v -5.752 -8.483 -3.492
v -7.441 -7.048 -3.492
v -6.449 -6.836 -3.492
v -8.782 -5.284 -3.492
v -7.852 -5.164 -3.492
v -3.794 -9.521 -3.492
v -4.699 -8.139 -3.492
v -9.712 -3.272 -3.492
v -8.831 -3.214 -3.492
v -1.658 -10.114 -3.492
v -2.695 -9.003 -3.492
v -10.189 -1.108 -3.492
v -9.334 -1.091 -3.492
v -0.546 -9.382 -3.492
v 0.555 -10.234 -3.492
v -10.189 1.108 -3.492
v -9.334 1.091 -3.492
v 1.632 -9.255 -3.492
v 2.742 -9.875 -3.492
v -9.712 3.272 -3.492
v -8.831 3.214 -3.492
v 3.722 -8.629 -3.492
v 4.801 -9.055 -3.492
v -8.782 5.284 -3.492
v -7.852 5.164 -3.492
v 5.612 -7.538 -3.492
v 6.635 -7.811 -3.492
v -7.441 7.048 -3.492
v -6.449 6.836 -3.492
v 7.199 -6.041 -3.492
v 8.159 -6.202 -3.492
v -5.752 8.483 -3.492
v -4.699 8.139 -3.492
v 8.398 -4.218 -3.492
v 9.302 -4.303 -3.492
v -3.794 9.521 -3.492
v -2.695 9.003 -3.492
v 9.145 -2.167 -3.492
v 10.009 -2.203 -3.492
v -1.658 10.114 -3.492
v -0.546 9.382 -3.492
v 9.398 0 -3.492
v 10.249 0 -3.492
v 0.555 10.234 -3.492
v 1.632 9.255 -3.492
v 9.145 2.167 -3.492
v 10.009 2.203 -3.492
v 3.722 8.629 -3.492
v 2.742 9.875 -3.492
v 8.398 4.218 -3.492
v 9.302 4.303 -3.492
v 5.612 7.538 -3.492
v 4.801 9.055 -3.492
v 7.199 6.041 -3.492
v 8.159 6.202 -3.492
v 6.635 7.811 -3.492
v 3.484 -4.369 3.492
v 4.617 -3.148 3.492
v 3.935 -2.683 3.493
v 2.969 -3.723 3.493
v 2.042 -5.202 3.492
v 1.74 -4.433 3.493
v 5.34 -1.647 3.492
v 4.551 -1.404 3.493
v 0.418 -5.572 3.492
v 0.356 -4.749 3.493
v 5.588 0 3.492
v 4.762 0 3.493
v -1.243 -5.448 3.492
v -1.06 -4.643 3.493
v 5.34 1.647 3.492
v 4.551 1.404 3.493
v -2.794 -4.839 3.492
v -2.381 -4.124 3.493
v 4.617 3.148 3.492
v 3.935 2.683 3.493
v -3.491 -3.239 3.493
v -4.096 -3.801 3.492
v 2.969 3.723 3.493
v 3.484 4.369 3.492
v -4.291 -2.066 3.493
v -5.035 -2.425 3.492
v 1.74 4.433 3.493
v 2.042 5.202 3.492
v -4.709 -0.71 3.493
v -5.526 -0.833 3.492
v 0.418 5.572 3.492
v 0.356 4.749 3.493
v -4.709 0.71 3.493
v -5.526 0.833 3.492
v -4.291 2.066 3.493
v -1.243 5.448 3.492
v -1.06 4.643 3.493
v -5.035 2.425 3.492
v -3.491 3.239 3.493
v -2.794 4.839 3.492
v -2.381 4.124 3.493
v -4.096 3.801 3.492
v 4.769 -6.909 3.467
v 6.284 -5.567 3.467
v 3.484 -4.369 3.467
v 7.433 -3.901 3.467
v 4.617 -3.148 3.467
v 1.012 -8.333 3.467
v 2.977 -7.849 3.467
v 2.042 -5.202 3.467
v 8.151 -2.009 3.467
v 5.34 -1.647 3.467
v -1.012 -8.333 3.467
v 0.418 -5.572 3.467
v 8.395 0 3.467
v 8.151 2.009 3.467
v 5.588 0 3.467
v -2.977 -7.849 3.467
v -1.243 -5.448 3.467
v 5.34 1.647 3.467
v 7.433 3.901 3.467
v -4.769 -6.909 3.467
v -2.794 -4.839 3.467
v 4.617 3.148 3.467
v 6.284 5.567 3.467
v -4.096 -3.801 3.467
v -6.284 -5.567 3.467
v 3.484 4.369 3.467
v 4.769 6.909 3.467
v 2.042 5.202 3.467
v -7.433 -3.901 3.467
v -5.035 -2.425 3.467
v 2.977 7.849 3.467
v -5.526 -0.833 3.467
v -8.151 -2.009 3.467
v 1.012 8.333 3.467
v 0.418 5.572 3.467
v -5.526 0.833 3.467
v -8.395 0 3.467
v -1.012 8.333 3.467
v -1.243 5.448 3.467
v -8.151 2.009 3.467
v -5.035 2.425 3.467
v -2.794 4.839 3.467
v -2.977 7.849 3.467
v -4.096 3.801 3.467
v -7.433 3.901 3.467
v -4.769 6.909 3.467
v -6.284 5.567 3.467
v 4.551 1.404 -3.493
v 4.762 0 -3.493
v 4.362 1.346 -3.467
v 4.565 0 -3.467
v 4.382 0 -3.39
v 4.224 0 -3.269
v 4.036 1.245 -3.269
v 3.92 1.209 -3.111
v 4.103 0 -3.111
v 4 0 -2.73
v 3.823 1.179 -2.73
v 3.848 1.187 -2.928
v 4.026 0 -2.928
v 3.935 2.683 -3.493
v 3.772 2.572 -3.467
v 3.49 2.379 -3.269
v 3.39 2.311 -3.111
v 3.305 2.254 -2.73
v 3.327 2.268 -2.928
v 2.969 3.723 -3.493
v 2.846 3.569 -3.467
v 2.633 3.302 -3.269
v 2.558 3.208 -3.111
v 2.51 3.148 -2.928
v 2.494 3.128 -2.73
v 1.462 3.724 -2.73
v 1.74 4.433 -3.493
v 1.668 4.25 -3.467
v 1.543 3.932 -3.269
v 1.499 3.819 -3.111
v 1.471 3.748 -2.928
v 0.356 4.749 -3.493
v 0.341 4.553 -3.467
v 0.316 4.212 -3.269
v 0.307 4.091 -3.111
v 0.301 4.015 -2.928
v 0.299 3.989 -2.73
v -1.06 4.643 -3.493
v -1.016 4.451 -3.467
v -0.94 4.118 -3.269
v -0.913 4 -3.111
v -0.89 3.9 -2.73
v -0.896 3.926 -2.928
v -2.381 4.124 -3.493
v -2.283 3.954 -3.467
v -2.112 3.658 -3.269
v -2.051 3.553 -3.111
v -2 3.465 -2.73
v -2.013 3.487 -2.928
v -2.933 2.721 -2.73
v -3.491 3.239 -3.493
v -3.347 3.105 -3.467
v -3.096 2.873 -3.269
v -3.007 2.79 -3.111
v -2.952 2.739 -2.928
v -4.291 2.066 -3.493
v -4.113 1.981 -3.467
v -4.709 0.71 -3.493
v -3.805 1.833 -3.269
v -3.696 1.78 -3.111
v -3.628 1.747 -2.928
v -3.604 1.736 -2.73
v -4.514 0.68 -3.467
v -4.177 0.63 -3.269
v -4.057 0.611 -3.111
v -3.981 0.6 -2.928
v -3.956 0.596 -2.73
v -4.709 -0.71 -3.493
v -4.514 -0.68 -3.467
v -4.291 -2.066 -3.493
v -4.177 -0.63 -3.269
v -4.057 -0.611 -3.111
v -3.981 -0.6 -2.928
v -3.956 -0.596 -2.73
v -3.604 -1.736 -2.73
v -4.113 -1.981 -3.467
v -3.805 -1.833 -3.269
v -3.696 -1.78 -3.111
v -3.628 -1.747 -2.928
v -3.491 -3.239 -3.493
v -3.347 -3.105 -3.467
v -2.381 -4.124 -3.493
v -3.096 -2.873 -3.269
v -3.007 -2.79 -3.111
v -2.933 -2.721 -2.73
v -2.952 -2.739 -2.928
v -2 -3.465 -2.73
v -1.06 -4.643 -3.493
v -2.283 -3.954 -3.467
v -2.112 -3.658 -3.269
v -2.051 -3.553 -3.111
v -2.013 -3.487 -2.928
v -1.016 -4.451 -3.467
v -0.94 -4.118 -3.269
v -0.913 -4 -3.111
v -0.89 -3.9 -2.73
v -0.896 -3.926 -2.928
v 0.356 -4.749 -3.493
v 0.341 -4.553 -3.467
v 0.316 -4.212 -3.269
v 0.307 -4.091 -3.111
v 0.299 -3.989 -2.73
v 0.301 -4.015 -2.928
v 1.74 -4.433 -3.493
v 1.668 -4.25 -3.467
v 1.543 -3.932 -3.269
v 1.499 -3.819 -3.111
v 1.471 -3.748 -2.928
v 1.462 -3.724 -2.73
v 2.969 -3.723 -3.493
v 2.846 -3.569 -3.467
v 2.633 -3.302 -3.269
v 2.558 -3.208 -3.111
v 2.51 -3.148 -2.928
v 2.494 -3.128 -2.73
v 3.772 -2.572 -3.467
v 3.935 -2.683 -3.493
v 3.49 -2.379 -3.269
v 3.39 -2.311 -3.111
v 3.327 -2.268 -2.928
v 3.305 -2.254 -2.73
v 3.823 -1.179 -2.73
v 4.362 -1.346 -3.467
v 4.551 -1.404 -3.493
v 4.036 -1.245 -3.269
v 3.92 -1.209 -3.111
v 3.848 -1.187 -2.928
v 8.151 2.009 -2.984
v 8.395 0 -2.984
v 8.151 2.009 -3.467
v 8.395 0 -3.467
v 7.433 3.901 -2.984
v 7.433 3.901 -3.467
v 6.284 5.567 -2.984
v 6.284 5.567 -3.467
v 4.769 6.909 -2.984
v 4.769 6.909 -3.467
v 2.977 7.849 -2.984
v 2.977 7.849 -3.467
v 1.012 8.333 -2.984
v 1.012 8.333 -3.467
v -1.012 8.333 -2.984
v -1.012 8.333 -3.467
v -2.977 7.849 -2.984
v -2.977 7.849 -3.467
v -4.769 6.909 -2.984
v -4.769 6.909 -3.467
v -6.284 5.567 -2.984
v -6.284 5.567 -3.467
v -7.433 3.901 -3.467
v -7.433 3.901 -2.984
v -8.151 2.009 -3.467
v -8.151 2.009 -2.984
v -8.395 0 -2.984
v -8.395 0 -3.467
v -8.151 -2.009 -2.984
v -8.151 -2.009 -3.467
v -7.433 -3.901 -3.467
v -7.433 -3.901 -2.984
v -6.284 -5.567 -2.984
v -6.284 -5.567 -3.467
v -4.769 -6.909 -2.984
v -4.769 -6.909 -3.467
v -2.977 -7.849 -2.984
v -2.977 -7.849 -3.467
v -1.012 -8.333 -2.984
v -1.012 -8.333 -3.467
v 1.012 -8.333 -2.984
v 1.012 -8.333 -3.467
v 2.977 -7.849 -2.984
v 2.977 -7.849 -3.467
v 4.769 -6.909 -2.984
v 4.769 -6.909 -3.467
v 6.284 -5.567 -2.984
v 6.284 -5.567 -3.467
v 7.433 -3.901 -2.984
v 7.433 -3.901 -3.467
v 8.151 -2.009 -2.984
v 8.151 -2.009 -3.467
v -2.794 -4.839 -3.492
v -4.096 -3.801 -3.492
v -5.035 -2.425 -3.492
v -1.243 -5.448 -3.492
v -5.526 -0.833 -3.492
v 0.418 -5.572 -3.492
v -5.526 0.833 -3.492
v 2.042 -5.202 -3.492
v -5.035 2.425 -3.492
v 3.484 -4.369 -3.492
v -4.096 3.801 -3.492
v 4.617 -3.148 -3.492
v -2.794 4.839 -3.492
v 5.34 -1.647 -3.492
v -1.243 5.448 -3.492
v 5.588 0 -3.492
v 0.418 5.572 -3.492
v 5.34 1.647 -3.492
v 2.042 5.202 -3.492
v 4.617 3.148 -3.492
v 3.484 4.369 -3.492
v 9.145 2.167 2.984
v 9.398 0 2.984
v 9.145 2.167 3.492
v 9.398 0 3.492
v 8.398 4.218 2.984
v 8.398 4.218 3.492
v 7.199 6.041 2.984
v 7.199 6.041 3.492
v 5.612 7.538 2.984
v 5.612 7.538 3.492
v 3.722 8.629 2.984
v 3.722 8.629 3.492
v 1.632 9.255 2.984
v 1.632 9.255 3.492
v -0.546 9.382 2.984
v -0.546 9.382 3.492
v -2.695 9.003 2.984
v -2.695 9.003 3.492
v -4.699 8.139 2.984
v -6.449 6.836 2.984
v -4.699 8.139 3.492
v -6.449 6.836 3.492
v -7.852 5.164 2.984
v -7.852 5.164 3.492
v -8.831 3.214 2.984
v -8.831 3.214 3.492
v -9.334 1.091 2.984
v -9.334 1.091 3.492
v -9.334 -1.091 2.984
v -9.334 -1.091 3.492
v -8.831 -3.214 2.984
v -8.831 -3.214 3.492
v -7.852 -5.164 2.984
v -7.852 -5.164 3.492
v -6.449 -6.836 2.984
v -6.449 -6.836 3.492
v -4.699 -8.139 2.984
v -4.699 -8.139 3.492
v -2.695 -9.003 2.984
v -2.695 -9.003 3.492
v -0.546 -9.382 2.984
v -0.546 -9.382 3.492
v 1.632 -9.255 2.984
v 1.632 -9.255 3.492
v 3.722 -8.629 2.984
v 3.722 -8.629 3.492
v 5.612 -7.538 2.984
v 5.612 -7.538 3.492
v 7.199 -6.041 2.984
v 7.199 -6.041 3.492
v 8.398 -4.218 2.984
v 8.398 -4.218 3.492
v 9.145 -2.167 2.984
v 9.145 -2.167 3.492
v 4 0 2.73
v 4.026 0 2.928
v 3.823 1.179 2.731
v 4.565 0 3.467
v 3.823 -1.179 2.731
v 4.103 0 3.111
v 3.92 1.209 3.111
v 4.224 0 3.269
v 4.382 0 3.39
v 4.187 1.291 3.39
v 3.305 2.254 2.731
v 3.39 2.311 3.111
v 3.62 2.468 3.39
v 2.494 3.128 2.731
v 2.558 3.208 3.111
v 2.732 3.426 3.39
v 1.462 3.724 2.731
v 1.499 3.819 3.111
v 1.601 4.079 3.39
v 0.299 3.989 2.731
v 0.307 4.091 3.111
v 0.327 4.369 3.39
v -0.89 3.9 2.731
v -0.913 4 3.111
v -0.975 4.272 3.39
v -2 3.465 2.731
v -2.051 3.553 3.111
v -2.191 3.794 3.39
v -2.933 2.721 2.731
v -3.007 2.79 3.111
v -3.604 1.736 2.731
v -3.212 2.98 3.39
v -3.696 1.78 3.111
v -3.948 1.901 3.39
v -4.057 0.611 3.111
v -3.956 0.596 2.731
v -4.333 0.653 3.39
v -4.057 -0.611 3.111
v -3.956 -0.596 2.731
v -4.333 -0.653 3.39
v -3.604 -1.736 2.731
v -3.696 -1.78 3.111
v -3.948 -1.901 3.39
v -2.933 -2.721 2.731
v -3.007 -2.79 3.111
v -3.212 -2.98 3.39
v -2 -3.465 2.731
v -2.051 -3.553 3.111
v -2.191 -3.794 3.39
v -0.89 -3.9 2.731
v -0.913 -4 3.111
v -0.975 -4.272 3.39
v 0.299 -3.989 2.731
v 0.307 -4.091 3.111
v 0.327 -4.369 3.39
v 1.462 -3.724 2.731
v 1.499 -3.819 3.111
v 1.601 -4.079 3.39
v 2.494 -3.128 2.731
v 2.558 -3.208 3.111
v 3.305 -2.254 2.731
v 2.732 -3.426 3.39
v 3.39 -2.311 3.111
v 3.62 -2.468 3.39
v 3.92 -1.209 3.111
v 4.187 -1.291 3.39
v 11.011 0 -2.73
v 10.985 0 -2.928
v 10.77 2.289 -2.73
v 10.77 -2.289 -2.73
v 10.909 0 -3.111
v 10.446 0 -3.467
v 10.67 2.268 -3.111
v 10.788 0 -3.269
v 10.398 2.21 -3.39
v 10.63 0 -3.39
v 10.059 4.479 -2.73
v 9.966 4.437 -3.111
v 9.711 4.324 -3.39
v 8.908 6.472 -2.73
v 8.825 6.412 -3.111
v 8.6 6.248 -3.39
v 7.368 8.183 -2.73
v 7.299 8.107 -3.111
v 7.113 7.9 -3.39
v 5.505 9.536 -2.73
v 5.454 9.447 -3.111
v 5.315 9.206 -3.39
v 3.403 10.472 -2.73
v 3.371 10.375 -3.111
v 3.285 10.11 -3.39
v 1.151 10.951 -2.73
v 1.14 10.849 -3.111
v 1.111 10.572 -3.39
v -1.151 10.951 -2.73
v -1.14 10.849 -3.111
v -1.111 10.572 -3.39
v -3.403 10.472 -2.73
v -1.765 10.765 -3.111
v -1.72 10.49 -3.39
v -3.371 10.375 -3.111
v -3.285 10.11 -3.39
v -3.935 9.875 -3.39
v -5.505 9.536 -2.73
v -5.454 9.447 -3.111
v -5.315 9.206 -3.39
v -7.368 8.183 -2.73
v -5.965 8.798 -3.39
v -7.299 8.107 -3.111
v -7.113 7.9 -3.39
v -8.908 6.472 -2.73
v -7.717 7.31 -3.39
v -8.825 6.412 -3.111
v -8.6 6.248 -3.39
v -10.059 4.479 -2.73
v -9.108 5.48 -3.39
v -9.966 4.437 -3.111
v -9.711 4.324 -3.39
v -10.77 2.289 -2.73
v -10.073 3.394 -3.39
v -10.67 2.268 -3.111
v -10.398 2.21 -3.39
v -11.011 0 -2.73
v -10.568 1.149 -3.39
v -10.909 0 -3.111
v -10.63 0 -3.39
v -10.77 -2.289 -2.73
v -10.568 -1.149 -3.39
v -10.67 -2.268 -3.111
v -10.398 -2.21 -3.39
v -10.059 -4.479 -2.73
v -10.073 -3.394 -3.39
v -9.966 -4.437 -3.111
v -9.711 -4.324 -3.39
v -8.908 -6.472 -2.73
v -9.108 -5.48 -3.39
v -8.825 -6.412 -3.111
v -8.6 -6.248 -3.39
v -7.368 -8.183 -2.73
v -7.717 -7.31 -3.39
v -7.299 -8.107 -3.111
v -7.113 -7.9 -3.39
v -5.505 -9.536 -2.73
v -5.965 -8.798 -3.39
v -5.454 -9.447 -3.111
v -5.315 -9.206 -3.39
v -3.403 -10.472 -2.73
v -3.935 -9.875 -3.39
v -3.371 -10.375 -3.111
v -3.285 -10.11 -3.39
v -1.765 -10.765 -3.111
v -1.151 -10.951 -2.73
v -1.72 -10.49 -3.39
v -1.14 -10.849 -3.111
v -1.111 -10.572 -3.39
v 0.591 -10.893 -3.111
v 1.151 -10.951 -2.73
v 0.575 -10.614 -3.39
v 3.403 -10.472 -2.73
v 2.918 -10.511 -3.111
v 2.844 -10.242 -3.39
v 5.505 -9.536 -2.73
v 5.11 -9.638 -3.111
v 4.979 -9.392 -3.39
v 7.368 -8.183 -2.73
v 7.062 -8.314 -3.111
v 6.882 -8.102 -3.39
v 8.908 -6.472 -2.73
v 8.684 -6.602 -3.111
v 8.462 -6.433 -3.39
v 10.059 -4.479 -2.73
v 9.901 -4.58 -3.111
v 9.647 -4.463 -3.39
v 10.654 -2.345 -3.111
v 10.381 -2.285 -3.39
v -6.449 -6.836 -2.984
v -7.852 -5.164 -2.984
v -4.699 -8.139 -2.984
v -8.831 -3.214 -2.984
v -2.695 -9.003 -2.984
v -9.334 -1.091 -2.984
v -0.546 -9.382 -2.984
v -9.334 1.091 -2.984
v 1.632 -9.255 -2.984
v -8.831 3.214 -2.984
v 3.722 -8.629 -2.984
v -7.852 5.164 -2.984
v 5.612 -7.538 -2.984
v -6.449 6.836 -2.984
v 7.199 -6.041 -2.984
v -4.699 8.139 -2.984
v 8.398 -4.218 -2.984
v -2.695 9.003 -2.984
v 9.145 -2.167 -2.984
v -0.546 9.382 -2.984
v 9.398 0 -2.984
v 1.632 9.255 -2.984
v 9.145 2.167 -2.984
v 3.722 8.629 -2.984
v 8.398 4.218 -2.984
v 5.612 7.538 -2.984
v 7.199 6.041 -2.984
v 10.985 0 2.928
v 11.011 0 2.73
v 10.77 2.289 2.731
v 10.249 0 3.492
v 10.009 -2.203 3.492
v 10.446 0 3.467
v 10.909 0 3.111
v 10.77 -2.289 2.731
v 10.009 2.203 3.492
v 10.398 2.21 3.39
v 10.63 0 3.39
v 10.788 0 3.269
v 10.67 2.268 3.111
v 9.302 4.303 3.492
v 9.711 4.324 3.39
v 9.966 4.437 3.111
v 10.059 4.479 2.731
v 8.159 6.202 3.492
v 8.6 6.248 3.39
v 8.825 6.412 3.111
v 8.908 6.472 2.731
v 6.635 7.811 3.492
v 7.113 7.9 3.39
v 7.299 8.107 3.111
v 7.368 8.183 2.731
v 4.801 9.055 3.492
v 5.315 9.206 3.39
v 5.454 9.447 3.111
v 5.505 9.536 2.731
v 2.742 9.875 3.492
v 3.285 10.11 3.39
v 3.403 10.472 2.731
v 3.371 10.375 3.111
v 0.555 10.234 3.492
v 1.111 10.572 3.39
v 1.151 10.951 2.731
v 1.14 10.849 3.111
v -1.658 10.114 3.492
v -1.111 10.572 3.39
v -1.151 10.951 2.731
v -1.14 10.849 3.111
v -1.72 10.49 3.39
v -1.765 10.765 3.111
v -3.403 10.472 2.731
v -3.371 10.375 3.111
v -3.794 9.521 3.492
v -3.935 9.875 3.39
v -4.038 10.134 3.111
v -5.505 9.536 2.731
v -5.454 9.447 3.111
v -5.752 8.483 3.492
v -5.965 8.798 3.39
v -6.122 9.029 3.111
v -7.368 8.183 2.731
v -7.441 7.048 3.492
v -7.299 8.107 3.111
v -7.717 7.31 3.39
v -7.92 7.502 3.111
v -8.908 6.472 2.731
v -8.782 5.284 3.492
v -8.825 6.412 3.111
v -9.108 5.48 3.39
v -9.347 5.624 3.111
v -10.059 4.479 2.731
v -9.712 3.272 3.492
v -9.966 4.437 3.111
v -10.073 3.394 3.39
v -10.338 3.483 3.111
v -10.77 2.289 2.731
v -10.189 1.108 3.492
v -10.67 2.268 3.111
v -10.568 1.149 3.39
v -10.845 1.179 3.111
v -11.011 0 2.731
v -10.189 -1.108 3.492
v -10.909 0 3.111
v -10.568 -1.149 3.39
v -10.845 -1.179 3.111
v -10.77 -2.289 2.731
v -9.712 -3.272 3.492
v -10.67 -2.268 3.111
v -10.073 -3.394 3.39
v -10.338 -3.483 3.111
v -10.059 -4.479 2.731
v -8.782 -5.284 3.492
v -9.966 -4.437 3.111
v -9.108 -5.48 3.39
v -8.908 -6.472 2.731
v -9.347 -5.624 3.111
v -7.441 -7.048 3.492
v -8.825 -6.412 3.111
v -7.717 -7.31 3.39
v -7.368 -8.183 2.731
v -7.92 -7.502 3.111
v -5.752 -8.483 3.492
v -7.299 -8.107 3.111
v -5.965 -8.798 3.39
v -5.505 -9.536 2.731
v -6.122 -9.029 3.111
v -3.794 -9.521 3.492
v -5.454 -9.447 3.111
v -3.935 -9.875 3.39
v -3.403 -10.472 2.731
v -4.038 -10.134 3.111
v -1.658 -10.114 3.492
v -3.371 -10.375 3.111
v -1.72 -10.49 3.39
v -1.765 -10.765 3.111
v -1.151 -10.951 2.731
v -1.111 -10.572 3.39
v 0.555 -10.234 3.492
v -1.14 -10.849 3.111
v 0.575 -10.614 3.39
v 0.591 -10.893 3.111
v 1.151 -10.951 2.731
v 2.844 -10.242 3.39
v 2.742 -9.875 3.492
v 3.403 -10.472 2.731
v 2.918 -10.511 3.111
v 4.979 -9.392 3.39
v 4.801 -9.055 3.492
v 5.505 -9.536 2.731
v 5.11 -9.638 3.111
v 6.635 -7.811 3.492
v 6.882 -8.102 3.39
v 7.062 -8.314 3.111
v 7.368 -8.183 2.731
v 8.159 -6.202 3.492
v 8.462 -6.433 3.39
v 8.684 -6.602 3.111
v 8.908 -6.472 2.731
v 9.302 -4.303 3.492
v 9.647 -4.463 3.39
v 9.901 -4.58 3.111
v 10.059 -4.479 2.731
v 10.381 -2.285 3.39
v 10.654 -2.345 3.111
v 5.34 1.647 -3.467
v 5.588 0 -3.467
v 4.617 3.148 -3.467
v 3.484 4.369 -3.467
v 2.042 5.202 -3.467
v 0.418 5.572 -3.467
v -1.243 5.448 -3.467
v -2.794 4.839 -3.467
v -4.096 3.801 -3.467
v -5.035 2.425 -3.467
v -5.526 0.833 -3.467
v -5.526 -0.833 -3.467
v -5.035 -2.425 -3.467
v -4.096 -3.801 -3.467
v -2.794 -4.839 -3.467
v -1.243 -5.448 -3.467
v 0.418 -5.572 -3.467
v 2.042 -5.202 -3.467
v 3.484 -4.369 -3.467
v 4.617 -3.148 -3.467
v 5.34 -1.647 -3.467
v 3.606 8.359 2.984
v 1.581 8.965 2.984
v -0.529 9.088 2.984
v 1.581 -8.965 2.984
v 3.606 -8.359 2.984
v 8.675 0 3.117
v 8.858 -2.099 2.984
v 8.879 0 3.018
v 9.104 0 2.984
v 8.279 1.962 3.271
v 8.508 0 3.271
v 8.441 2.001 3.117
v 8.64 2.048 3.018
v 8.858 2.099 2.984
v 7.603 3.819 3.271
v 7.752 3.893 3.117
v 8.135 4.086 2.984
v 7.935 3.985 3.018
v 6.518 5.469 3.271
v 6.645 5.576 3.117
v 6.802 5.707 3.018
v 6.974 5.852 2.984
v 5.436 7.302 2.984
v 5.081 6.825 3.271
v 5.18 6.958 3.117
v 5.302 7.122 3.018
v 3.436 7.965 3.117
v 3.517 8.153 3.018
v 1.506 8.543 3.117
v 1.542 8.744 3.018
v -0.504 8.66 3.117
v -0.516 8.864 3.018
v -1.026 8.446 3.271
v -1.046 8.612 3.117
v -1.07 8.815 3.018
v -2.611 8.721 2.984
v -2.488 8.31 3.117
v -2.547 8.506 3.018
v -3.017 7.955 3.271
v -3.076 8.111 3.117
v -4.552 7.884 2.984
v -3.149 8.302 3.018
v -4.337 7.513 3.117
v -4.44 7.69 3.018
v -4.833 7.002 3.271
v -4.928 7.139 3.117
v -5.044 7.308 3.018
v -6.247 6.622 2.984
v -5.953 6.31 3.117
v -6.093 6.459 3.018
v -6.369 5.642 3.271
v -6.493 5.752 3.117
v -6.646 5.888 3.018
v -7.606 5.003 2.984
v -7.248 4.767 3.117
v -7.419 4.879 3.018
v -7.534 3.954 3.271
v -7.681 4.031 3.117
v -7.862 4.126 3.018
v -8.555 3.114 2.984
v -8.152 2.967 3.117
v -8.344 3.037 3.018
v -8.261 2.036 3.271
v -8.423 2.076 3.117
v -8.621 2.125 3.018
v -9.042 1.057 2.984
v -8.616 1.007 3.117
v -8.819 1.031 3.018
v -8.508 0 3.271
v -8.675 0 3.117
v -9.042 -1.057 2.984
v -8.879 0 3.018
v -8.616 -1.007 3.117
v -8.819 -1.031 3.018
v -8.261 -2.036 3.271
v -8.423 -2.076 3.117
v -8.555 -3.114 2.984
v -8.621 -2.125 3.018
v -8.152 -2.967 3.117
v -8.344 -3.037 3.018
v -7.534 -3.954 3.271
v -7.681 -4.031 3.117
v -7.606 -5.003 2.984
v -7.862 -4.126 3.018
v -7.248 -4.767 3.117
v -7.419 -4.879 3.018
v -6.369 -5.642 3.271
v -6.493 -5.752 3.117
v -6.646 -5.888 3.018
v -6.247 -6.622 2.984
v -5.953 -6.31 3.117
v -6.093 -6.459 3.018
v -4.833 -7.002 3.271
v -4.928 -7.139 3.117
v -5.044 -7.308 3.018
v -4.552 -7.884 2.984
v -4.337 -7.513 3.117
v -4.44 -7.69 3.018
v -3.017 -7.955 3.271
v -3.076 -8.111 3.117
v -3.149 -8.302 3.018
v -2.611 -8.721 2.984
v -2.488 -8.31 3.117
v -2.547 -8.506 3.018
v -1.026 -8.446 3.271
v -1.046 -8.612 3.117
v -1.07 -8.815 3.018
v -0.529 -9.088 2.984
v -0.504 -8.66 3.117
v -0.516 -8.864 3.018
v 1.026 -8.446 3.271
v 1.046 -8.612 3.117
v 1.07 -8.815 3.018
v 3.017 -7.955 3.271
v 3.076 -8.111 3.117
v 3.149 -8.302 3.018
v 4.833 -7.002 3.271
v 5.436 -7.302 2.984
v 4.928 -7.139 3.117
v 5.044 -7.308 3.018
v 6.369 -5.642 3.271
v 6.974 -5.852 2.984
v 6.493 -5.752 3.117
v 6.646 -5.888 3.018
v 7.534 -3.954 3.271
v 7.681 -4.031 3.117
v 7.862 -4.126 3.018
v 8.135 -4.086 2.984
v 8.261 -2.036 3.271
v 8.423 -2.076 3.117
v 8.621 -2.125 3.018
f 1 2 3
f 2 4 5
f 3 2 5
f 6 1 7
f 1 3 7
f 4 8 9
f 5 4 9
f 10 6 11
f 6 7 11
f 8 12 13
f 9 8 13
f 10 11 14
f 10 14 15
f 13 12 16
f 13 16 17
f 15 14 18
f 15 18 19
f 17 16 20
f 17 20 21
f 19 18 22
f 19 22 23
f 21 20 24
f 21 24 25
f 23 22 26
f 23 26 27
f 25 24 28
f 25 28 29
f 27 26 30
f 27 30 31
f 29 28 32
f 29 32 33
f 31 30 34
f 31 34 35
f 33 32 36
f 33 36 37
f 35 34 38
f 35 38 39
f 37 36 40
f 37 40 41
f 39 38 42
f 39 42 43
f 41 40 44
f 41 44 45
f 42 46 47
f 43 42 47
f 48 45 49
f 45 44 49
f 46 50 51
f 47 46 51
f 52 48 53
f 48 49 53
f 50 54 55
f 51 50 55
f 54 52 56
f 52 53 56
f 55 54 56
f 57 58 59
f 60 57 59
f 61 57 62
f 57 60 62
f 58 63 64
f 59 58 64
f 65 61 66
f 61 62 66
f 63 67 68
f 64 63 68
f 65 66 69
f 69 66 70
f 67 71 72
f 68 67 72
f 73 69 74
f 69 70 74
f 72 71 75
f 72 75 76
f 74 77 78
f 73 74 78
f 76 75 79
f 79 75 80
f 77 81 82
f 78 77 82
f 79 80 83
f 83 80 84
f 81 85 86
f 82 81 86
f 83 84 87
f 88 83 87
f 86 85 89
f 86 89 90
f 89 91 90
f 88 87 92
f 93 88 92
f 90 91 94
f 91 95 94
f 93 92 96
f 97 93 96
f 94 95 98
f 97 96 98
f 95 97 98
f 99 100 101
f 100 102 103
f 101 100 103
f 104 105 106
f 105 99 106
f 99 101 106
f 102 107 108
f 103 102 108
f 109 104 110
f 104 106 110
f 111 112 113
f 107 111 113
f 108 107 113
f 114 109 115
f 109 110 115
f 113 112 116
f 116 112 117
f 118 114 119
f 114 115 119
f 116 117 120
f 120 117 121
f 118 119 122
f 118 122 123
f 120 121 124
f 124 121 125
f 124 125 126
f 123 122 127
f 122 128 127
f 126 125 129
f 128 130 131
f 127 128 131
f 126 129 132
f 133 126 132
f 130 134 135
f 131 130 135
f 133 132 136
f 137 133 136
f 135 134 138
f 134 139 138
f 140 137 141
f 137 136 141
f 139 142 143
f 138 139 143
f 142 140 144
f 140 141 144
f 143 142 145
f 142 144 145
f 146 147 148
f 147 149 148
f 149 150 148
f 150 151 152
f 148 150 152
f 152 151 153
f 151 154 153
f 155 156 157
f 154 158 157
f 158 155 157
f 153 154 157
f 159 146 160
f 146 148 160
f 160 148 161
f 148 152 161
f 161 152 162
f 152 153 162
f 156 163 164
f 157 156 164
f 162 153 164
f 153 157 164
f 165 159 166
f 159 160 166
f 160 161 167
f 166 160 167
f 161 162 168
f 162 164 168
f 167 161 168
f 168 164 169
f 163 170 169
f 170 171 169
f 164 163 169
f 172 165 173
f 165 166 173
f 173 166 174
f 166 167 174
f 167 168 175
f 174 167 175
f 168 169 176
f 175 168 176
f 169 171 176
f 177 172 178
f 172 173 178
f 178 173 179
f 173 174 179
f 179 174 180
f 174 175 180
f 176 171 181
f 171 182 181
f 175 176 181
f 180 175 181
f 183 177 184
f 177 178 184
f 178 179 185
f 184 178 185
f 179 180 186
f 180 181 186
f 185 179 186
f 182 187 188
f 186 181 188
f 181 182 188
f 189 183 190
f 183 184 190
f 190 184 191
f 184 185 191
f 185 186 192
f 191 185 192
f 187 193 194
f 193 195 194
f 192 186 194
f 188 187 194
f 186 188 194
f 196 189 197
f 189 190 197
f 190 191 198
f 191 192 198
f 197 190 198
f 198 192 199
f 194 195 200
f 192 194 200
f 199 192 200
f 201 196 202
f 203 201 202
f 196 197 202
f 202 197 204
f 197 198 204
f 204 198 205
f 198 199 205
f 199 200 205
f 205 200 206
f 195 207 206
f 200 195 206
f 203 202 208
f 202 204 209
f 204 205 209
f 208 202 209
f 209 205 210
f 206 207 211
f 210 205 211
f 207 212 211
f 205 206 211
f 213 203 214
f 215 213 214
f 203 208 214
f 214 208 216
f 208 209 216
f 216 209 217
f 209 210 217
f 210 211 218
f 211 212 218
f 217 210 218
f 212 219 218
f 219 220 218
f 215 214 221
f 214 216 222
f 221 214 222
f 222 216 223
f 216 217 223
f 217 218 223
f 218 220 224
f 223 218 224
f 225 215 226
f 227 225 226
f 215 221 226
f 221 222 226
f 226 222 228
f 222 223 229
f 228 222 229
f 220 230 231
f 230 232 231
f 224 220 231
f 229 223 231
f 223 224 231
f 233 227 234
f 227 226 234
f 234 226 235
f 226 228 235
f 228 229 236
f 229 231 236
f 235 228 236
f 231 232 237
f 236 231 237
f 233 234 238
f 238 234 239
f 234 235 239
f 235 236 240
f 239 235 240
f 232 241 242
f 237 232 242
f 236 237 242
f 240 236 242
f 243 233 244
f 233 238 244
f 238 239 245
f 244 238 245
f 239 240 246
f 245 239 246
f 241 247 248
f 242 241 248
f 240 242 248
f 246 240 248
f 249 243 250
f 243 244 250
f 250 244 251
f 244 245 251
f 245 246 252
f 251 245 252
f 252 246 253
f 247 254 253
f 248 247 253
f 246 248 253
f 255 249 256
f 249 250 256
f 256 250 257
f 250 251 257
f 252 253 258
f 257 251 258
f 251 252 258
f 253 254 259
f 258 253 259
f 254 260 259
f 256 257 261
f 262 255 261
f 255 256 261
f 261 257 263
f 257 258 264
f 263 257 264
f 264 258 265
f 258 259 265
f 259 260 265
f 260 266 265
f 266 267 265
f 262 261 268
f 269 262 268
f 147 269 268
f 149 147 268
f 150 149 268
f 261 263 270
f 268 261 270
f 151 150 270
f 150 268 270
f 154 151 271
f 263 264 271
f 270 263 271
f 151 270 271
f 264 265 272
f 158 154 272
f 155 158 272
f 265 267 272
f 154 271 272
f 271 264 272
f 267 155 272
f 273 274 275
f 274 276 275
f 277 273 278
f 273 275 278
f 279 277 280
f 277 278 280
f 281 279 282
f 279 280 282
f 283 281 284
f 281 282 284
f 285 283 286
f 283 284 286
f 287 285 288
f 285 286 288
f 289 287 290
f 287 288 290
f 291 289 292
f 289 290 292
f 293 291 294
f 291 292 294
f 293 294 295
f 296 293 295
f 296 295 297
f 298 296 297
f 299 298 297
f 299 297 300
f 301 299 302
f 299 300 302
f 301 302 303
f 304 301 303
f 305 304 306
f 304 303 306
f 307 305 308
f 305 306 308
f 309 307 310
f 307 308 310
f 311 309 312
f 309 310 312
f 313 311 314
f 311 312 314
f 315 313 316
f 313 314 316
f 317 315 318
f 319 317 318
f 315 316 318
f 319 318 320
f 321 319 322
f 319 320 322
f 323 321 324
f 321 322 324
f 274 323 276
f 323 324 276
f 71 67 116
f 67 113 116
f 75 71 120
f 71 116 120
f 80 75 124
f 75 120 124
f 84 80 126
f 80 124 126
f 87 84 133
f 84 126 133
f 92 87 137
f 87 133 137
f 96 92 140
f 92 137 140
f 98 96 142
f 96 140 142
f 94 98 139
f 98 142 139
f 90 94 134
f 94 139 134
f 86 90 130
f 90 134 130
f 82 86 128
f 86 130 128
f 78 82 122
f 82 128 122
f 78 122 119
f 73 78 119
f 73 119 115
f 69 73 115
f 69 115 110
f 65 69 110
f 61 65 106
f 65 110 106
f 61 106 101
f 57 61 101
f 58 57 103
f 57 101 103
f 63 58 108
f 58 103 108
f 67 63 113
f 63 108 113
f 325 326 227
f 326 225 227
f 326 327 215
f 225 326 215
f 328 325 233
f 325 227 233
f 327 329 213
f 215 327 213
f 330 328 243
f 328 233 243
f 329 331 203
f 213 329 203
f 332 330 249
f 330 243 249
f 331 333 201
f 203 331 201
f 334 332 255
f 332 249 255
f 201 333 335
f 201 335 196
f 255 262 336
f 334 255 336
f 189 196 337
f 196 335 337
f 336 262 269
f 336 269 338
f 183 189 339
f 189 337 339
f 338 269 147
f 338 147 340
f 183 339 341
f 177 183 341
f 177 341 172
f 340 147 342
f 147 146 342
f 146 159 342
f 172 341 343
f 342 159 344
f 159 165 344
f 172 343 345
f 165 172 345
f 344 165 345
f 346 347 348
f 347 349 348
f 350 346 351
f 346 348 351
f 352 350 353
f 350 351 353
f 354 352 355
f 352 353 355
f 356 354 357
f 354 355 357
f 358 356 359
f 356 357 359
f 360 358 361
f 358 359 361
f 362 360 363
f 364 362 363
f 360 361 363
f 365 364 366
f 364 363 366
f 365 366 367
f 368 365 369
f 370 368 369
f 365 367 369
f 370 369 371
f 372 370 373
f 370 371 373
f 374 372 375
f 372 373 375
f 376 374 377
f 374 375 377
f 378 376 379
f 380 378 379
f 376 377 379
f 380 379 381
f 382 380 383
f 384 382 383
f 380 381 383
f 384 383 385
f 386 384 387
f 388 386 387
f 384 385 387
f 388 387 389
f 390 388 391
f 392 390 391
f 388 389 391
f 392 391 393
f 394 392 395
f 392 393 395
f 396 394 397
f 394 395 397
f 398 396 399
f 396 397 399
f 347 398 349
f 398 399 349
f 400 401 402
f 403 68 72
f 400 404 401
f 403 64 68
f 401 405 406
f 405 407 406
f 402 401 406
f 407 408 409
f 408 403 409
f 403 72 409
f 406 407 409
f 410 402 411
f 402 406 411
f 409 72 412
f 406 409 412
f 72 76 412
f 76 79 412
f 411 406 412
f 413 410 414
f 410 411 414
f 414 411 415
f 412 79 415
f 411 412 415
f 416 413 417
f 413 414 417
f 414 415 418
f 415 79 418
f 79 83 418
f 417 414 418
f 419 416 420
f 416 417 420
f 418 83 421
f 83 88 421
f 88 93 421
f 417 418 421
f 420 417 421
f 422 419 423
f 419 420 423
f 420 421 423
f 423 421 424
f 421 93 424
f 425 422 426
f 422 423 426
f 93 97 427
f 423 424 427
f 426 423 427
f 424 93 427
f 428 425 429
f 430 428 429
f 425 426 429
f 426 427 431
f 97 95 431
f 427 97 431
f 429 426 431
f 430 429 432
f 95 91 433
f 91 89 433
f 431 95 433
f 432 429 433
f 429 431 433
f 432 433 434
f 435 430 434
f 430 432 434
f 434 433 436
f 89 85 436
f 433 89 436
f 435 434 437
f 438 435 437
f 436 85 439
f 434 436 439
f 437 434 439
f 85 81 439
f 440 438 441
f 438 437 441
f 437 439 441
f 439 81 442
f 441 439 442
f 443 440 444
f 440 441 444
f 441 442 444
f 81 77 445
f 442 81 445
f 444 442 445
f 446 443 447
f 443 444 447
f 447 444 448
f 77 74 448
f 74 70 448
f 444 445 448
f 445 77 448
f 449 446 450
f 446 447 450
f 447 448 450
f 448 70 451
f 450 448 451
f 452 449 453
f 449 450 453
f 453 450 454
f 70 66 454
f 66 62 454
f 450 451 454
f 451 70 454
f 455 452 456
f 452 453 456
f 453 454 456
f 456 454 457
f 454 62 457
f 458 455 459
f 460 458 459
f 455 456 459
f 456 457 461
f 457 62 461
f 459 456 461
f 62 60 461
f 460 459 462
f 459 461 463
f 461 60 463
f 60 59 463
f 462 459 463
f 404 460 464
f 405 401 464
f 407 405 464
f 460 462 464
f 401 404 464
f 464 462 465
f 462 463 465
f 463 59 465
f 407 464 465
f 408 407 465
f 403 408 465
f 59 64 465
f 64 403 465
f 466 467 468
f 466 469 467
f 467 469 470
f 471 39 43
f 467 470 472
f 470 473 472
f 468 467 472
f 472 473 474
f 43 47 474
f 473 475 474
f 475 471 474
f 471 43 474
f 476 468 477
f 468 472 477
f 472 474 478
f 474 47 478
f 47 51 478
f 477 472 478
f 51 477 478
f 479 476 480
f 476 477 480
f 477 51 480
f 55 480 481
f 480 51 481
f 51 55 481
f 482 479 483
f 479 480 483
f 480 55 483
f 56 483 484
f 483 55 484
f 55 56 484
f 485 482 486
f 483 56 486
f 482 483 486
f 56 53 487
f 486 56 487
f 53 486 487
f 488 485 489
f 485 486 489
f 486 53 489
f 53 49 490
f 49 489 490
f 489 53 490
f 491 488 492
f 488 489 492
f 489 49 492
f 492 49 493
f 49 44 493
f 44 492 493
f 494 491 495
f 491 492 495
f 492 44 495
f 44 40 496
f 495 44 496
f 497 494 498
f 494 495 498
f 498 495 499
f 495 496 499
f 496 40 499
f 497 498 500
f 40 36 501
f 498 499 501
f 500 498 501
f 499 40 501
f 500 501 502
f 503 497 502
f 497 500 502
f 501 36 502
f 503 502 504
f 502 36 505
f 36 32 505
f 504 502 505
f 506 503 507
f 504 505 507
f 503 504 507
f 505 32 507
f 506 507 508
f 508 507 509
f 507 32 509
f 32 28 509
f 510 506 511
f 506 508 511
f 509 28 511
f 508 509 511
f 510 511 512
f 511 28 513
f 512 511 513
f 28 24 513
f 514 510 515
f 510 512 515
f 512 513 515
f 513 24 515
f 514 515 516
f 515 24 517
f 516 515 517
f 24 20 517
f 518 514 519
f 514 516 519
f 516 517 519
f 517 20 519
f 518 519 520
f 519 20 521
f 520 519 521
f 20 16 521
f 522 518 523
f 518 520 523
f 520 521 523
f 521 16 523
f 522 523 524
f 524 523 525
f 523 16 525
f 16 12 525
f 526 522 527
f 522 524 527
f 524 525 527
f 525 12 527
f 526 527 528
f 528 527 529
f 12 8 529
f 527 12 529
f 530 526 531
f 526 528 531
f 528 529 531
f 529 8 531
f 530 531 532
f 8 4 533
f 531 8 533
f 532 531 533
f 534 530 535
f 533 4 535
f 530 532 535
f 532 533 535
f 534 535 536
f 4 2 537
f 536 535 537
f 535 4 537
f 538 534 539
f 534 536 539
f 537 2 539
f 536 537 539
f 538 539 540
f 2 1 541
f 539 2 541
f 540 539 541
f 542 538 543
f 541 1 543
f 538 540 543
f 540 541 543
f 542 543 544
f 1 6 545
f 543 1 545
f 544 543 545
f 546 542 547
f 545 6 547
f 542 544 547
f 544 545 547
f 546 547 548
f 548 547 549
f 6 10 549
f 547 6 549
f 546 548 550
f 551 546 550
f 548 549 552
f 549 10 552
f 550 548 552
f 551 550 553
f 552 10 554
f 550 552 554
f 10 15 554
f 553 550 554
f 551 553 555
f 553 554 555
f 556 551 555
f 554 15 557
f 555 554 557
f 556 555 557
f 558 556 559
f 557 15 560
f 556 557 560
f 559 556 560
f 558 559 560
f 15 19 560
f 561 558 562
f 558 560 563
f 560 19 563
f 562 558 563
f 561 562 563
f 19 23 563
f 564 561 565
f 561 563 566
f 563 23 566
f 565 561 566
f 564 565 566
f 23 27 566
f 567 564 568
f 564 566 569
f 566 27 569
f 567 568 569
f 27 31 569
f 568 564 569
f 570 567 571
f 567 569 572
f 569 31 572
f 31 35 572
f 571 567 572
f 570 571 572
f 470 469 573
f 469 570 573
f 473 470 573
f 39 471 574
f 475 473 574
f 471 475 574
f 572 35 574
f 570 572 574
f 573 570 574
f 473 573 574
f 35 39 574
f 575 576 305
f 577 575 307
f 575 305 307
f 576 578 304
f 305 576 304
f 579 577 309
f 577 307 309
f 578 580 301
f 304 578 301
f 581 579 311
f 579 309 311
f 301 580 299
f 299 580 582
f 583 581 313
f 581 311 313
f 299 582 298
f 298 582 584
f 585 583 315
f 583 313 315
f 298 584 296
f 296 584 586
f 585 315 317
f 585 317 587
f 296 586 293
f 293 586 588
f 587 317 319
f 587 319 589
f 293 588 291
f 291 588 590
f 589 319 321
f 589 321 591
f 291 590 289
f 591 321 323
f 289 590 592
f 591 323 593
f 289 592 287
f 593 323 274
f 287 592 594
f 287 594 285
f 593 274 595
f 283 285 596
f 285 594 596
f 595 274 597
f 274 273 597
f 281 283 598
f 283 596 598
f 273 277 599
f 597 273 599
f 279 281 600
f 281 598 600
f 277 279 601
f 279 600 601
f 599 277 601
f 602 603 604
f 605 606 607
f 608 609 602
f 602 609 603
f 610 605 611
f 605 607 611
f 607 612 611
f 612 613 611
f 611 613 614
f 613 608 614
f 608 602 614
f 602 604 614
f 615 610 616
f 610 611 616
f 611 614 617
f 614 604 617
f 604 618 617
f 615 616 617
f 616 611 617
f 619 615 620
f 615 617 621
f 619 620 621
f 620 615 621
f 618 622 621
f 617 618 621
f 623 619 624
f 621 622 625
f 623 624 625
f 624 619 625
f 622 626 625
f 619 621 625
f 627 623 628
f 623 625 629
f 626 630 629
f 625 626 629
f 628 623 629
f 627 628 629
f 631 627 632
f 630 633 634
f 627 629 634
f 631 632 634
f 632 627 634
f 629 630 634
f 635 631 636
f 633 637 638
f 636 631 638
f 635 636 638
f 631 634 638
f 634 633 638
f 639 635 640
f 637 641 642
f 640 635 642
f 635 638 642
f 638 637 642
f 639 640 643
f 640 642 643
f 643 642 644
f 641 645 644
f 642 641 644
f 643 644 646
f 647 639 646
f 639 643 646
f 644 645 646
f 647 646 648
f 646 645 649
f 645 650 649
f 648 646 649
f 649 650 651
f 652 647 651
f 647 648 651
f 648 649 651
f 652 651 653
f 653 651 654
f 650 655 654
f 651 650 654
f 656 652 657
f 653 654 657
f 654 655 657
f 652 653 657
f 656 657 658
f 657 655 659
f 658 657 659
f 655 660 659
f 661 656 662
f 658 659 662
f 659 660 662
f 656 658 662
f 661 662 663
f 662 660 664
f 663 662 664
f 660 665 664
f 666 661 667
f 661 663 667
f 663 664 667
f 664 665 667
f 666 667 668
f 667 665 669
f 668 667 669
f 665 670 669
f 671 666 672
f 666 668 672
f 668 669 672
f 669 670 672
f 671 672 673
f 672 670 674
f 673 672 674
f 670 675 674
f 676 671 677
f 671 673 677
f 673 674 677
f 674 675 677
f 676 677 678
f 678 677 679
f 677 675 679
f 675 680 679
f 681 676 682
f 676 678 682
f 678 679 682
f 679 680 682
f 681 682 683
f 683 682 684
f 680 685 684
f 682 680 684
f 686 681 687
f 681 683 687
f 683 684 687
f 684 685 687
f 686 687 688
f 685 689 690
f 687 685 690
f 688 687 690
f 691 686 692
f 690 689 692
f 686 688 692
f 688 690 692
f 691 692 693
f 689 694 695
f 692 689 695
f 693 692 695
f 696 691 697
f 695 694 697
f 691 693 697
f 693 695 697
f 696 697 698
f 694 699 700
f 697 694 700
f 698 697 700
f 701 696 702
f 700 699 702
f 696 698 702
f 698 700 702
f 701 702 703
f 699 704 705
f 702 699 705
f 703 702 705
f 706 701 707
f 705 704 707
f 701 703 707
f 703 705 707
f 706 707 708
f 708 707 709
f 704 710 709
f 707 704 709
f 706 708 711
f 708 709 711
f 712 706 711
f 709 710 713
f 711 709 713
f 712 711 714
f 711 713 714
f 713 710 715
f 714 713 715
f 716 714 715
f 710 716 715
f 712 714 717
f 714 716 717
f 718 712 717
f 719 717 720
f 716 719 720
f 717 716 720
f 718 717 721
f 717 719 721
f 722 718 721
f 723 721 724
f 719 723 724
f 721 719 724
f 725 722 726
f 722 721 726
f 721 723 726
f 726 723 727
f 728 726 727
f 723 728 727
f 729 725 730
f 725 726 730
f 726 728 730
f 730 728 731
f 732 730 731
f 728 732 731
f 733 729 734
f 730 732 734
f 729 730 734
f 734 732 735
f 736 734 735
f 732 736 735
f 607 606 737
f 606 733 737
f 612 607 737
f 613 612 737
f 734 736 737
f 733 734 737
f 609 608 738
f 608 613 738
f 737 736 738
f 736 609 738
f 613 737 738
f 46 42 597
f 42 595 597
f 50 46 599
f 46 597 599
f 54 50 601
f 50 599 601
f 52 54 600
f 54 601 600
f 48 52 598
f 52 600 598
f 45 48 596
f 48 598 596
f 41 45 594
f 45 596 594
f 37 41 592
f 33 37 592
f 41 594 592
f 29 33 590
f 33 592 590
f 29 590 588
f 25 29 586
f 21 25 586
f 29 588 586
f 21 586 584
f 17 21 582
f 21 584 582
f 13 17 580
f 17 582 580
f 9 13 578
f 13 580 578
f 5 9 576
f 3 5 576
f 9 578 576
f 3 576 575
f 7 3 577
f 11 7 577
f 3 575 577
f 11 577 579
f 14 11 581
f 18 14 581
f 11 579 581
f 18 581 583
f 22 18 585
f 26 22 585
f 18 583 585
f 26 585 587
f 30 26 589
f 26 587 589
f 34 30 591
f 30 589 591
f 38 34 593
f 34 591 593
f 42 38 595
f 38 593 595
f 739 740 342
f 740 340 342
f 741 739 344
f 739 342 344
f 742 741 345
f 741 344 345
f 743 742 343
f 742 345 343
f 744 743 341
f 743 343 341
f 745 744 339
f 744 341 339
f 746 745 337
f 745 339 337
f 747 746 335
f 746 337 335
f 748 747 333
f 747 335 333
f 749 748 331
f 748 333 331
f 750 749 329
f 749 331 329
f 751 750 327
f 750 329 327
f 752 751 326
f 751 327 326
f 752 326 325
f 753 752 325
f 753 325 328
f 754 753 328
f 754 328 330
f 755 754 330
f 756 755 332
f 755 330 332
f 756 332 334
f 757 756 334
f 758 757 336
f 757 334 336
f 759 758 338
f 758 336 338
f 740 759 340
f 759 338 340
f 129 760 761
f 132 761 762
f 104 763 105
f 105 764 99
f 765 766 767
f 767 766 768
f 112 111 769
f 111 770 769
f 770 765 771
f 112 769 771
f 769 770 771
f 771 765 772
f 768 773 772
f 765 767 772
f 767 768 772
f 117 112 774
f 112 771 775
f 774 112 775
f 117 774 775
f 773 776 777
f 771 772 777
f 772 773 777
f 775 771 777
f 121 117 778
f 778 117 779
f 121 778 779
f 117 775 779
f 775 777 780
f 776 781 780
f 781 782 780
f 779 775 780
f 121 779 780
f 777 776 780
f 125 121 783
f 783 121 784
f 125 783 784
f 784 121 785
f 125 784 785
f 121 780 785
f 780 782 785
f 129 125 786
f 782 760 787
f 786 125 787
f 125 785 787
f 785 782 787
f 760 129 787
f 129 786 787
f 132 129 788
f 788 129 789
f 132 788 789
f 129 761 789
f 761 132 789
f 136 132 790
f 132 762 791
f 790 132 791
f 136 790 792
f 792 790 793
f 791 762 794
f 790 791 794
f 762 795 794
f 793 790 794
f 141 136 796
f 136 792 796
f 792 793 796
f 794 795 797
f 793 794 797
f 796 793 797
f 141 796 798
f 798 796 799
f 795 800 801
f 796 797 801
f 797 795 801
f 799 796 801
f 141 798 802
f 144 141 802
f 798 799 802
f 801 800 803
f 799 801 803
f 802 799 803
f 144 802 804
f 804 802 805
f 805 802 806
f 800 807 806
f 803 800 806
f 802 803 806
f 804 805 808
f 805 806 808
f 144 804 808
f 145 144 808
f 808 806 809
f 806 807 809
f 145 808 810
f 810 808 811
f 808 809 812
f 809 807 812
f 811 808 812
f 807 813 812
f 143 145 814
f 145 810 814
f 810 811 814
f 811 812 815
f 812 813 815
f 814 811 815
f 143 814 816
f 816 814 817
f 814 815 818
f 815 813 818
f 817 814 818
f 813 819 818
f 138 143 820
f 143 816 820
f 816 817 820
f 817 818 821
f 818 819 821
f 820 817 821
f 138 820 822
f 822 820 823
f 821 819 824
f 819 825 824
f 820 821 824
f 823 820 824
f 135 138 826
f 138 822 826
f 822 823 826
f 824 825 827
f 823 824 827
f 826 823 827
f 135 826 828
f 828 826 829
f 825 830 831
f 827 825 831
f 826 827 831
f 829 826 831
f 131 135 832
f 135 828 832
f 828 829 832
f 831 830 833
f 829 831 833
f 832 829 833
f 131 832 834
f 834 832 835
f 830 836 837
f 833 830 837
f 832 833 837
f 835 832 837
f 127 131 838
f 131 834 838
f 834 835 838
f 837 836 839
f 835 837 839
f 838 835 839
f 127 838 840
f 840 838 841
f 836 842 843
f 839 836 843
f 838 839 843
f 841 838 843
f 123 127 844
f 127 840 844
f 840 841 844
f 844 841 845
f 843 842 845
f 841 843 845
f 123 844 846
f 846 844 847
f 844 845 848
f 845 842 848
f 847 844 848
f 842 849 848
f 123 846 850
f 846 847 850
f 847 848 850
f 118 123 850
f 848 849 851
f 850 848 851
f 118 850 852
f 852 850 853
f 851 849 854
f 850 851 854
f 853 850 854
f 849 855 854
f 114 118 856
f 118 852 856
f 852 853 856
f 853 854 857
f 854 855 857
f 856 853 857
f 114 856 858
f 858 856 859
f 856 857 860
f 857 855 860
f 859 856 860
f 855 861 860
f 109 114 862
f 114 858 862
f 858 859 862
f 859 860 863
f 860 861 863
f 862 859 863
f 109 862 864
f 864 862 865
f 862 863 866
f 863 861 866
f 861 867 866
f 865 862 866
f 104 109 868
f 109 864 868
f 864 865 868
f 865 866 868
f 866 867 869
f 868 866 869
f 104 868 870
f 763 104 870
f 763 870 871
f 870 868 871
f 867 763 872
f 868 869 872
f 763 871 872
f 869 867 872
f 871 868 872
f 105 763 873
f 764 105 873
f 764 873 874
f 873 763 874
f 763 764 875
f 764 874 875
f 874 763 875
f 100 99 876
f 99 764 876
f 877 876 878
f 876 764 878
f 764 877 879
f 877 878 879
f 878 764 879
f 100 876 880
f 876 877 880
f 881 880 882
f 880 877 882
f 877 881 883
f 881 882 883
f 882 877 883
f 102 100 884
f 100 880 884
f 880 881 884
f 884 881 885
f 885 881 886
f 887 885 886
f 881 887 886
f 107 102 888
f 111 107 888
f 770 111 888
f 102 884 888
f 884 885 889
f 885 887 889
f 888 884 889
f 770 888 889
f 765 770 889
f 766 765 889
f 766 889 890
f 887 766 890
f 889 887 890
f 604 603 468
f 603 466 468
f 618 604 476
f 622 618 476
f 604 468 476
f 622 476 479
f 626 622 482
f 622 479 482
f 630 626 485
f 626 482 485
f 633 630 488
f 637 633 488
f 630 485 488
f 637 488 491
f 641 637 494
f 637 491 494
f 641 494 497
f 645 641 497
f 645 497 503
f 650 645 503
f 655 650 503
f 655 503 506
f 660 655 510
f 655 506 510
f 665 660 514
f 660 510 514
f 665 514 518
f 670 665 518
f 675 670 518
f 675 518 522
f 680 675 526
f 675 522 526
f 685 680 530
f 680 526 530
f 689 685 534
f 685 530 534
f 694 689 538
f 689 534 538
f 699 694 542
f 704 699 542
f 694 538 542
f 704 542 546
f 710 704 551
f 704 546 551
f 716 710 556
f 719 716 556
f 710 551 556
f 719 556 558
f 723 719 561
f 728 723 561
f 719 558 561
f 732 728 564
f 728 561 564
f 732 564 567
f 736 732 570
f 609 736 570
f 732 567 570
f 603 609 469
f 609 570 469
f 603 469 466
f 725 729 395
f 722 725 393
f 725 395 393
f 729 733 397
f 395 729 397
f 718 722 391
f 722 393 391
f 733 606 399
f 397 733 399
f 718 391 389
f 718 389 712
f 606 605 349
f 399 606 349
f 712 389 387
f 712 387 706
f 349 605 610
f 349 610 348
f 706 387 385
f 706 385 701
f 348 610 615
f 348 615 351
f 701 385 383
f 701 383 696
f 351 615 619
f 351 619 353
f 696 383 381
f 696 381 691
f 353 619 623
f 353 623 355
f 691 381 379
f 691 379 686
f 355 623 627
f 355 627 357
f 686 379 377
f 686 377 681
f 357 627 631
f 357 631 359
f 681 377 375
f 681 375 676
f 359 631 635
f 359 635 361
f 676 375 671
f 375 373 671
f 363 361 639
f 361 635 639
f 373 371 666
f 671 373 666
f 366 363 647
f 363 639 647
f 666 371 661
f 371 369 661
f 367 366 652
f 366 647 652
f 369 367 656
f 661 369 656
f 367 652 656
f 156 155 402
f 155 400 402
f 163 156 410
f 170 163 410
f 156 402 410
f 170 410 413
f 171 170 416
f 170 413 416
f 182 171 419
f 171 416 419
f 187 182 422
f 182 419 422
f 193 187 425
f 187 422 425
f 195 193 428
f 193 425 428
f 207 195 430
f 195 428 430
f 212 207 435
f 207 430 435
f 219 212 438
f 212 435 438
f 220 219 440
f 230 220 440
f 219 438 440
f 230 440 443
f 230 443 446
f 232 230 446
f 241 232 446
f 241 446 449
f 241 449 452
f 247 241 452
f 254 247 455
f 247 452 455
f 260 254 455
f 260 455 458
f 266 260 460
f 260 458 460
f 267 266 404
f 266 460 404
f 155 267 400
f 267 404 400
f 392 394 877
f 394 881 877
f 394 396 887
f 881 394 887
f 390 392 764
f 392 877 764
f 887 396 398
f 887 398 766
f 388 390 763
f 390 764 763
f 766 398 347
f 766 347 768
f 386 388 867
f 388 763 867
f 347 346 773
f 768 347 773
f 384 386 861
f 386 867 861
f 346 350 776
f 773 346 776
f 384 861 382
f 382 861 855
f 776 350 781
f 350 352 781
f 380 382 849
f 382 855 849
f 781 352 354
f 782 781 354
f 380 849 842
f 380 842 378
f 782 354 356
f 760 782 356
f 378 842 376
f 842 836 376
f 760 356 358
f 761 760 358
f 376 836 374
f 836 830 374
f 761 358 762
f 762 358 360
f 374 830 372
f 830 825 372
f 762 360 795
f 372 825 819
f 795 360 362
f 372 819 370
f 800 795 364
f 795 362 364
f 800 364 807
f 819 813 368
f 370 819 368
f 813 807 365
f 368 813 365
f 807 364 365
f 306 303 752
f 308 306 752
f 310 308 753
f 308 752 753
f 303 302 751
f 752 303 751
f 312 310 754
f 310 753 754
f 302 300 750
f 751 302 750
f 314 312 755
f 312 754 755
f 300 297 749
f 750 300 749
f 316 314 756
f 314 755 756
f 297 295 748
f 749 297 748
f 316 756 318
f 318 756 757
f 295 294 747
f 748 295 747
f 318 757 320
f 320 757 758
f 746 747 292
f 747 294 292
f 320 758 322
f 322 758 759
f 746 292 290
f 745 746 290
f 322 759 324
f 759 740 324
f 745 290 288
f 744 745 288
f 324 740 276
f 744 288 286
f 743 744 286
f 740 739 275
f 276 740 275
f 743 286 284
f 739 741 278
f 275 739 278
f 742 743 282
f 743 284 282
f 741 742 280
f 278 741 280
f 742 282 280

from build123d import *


with BuildPart() as part:
    # Sketch1 → Revolve1 (revolve)
    with BuildSketch(Plane(origin=(0, 0, 0), x_dir=(1, 0, 0), z_dir=(0, 1, 0))):
        with BuildLine():
            Line((4.0005, 2.7305), (4.0005, -2.7305))
            ThreePointArc((4.0005, -2.7305), (4.223684633, -3.269315367), (4.7625, -3.4925))
            Line((4.7625, -3.4925), (5.588, -3.4925))
            Line((5.588, -3.4925), (5.588, -3.4671))
            Line((5.588, -3.4671), (8.3947, -3.4671))
            ThreePointArc((8.3947, -3.4671), (8.674827163, -3.116600484), (9.103628515, -2.9845))
            Line((9.103628515, -2.9845), (9.398, -2.9845))
            Line((9.398, -2.9845), (9.398, -3.4925))
            Line((9.398, -3.4925), (10.2489, -3.4925))
            ThreePointArc((10.2489, -3.4925), (10.787715367, -3.269315367), (11.0109, -2.7305))
            Line((11.0109, -2.7305), (11.0109, 2.7305))
            ThreePointArc((11.0109, 2.7305), (10.787715367, 3.269315367), (10.2489, 3.4925))
            Line((10.2489, 3.4925), (9.398, 3.4925))
            Line((9.398, 3.4925), (9.398, 2.9845))
            Line((9.398, 2.9845), (8.3947, 2.9845))
            Line((8.3947, 2.9845), (8.3947, 3.4671))
            Line((8.3947, 3.4671), (5.588, 3.4671))
            Line((5.588, 3.4671), (5.588, 3.4925))
            Line((5.588, 3.4925), (4.7625, 3.4925))
            ThreePointArc((4.7625, 3.4925), (4.223684633, 3.269315367), (4.0005, 2.7305))
        make_face()
    revolve(axis=Axis((0, 0, -3.495313106), (0, 0, 1)))


solid = part.part
